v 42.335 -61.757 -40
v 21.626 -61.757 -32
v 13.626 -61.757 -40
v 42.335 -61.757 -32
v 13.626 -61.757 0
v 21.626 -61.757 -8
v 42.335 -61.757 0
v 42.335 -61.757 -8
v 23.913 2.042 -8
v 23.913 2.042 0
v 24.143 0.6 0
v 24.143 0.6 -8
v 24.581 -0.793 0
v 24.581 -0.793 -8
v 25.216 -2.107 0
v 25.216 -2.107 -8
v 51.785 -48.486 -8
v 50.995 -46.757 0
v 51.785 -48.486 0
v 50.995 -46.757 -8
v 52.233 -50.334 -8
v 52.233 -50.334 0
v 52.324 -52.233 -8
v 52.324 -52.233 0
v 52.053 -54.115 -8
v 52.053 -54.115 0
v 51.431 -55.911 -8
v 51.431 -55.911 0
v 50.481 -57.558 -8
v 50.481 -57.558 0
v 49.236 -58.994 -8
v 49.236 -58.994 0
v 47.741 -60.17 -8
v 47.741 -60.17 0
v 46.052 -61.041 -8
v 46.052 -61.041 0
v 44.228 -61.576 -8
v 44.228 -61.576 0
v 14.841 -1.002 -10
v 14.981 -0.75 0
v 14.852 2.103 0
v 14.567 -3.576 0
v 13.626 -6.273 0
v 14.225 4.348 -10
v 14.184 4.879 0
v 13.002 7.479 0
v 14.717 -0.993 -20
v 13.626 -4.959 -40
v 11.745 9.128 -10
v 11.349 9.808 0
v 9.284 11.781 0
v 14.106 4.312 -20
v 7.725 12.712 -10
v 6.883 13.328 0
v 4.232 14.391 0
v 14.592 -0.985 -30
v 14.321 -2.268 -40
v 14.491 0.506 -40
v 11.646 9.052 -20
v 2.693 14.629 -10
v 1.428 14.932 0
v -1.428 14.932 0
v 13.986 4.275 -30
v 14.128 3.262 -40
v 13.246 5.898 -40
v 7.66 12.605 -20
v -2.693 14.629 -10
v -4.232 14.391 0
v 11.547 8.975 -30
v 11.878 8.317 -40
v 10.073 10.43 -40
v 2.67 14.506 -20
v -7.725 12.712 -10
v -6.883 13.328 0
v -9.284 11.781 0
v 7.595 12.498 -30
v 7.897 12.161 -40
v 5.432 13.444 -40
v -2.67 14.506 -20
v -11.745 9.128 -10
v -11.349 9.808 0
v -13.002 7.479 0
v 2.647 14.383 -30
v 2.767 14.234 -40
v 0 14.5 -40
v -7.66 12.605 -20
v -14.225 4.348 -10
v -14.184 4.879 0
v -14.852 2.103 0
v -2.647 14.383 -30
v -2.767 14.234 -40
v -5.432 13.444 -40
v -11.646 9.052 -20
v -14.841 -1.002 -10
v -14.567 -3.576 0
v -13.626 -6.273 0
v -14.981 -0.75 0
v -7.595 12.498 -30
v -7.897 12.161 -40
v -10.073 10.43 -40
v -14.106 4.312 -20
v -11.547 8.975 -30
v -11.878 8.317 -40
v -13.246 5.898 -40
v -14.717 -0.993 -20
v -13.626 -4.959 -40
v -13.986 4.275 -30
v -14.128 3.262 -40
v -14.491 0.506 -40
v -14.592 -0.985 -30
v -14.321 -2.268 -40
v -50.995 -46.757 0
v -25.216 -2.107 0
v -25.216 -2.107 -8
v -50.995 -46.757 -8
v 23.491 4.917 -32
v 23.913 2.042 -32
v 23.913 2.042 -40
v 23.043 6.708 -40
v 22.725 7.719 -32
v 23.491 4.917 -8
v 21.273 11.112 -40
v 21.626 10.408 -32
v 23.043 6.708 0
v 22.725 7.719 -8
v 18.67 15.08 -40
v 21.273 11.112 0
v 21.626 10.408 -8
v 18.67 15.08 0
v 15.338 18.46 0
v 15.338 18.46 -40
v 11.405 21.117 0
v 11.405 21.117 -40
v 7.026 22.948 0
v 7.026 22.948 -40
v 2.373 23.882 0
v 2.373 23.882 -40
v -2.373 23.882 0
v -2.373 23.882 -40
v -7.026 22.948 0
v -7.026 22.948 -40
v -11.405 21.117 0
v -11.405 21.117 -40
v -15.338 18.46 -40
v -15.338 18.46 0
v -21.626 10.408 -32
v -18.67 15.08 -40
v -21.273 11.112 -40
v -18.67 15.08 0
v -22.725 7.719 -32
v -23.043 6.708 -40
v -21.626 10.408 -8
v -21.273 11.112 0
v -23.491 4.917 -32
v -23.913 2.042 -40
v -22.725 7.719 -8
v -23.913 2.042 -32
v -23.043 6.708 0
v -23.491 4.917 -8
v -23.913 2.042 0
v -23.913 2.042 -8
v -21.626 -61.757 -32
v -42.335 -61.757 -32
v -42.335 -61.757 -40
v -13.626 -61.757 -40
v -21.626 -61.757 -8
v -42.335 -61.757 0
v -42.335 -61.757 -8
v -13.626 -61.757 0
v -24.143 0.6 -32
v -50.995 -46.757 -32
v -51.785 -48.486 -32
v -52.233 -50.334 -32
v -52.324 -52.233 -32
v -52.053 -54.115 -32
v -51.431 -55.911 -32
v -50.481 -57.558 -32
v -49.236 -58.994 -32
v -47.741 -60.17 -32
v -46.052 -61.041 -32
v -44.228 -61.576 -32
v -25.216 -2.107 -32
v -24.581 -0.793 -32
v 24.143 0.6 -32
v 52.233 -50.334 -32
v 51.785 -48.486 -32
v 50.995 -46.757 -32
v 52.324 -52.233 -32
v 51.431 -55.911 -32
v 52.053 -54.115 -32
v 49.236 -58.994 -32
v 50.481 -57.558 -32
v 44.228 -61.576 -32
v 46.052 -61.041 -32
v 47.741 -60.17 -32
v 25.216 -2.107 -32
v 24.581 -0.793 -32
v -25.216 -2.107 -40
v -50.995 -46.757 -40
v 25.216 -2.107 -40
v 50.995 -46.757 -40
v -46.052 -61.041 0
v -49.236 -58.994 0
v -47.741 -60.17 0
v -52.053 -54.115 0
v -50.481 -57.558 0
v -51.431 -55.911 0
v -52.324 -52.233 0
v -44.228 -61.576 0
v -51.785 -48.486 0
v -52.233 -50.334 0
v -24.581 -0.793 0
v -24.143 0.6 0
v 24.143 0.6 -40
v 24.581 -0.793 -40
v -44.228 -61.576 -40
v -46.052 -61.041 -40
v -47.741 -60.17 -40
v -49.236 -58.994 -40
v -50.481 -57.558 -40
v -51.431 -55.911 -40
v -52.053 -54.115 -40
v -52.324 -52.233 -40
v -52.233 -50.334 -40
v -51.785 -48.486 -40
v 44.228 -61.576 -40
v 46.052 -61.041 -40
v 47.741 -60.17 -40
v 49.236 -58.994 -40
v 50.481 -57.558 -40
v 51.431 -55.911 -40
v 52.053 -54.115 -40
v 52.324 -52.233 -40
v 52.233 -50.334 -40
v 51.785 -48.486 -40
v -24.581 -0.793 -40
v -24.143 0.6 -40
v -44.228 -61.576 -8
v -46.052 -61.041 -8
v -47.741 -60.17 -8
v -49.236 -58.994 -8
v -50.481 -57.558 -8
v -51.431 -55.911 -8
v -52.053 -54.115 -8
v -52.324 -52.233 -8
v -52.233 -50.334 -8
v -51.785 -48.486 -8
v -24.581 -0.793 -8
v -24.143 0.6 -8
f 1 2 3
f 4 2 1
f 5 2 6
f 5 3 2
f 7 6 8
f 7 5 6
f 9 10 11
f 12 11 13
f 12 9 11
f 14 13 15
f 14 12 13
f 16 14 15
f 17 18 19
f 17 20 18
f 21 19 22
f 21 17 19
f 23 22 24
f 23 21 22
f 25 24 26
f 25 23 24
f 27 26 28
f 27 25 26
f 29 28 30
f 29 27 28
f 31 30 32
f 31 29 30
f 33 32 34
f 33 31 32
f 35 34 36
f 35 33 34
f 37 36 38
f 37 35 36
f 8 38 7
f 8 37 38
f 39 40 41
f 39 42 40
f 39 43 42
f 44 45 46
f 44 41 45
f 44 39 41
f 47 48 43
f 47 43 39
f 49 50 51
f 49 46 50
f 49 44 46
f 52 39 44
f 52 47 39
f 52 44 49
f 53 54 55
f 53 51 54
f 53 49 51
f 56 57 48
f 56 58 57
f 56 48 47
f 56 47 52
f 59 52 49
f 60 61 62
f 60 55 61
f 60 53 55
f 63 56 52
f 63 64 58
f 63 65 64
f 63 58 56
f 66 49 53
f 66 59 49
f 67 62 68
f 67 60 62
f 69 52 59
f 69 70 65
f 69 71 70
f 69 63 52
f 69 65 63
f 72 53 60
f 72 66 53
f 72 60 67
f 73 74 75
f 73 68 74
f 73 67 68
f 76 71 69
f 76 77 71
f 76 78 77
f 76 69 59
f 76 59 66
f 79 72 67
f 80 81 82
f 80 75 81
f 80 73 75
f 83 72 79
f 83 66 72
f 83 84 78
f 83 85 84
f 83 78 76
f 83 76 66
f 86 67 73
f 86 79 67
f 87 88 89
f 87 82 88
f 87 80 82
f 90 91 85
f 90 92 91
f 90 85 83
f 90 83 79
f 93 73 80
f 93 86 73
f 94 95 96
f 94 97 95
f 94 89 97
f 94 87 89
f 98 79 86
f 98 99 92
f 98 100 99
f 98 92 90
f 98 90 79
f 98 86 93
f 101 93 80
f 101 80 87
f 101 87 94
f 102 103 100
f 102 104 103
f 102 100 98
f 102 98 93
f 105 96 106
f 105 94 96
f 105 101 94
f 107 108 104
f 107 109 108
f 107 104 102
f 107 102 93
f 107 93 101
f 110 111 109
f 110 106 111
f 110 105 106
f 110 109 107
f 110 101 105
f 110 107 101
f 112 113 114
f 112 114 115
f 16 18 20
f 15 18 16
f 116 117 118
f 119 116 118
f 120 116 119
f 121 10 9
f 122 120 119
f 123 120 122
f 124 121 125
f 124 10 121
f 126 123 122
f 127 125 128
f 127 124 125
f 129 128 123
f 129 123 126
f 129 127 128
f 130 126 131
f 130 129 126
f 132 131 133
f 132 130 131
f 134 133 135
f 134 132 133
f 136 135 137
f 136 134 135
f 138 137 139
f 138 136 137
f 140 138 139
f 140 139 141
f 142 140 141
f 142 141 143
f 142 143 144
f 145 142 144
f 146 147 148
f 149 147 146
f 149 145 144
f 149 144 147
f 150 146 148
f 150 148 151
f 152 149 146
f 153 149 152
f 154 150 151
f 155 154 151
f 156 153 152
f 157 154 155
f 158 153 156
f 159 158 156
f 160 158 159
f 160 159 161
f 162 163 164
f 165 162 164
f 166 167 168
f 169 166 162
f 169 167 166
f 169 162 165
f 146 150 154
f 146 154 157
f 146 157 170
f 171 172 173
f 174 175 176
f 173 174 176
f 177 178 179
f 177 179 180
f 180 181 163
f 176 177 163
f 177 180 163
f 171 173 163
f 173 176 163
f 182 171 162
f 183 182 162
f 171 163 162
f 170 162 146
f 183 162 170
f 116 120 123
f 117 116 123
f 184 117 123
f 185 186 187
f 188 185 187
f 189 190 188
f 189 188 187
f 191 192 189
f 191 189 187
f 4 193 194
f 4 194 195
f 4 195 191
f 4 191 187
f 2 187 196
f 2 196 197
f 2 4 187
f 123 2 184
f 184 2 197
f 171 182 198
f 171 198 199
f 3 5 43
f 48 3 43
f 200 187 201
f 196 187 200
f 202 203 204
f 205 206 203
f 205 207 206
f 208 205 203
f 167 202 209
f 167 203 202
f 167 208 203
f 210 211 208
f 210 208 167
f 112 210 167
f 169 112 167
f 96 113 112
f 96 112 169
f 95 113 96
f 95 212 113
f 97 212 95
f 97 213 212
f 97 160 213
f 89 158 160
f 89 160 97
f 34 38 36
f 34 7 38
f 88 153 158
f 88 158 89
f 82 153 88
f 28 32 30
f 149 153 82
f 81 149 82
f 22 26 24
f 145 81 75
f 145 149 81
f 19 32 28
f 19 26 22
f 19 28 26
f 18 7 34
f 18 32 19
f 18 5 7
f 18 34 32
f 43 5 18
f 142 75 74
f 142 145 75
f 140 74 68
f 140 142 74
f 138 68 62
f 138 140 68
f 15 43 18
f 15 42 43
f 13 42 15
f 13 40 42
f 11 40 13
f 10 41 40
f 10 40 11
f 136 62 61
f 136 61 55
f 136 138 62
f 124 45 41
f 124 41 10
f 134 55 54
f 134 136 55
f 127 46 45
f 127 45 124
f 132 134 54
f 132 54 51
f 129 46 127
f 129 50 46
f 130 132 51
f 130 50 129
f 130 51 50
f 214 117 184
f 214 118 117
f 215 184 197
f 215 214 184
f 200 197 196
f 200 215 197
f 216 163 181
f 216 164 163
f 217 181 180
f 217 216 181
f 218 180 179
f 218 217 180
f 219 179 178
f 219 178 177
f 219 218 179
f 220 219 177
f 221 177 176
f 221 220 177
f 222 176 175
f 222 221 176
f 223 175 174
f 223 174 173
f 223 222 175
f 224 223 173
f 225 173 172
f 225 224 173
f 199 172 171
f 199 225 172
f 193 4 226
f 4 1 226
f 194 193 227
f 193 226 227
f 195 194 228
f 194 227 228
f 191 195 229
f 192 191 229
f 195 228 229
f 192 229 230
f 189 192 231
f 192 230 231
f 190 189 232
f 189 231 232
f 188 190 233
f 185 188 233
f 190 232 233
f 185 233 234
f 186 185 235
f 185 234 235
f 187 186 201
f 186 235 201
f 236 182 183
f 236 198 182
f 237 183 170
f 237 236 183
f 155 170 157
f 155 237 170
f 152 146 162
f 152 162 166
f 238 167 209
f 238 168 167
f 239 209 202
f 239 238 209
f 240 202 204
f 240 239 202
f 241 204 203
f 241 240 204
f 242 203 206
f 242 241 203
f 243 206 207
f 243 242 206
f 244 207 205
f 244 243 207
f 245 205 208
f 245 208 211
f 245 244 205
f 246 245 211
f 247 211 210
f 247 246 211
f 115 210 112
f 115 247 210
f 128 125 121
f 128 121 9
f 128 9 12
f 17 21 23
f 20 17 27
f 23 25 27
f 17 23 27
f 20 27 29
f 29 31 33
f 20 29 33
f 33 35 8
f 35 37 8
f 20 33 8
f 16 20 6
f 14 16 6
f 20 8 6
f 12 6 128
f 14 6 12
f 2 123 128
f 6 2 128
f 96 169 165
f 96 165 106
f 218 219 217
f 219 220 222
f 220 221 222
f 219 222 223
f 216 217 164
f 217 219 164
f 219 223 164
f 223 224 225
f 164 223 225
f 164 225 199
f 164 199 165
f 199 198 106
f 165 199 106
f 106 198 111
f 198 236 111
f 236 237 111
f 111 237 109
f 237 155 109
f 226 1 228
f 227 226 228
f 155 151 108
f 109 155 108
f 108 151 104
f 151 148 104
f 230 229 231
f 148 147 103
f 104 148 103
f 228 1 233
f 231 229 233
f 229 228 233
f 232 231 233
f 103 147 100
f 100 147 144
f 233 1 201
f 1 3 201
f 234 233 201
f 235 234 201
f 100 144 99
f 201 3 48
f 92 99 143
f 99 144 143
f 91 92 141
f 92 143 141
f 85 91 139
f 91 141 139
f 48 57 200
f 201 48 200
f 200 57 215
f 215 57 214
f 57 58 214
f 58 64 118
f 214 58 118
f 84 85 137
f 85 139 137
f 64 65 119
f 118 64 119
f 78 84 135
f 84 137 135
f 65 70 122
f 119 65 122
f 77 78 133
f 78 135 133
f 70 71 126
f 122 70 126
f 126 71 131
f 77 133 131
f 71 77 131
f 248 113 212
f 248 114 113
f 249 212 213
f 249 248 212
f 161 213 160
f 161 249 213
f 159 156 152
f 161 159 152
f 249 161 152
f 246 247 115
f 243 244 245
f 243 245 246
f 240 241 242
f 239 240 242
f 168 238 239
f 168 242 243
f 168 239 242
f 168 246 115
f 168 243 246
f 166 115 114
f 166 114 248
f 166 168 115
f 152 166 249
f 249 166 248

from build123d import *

# Parameters (mm, degrees)
F3_R      = 24
F4_DEPTH  = 40
F0_R      = 15
F2_R      = 14.5
F7_DEPTH  = 40.0010001
F9_DEPTH  = 40
F10_W     = 38.0299583572
F10_H     = 24
F11_DEPTH = 85.7581399225
F12_R     = 10
F13_R     = 10


# Not quite as in the source:
# - a pattern or mirror of a feature is missing from the dataset's text; its kind, count and spacing are read off the source's solid


with BuildPart() as f4:
    # F3 (on Top) → F4 (new body)
    with BuildSketch(Plane.XY):
        Circle(F3_R)
    extrude(amount=-F4_DEPTH)

    # F0 (on Top) → F5 section 0
    with BuildSketch(Plane.XY):
        Circle(F0_R)
    # F2 (on offset) → F5 section 1
    with BuildSketch(Plane.XY.offset(-40)):
        Circle(F2_R)
    loft(mode=Mode.SUBTRACT)

    # F6 (on face) → F7 (cut, through all)
    with BuildSketch(Plane.XY):
        with BuildLine():
            Line((-13.6255430014, -6.272525641), (-13.6255430014, -19.7571399225))
            ThreePointArc((-13.6255430014, -19.7571399225), (0, -24), (13.6255430014, -19.7571399225))
            Line((13.6255430014, -19.7571399225), (13.6255430014, -6.272525641))
            ThreePointArc((13.6255430014, -6.272525641), (0, -15), (-13.6255430014, -6.272525641))
        make_face()
        with BuildLine():
            Line((-13.6255430014, -4.9592920782), (-13.6255430014, -6.272525641))
            ThreePointArc((-13.6255430014, -6.272525641), (0, -15), (13.6255430014, -6.272525641))
            Line((13.6255430014, -6.272525641), (13.6255430014, -4.9592920782))
            ThreePointArc((13.6255430014, -4.9592920782), (0, -14.5), (-13.6255430014, -4.9592920782))
        make_face()
    extrude(amount=-F7_DEPTH, mode=Mode.SUBTRACT)

    # F8 (on face) → F9 (join)
    with BuildSketch(Plane.XY):
        with BuildLine():
            Line((-13.6255430014, -61.7571399225), (-13.6255430014, -19.7571399225))
            ThreePointArc((-13.6255430014, -19.7571399225), (-21.248682689, -11.1576648087), (-24, 0))
            Line((-24, 0), (-59.6555013586, -61.7571399225))
            Line((-59.6555013586, -61.7571399225), (-13.6255430014, -61.7571399225))
        make_face()
        with BuildLine():
            ThreePointArc((24, 0), (21.248682689, -11.1576648087), (13.6255430014, -19.7571399225))
            Line((13.6255430014, -19.7571399225), (13.6255430014, -61.7571399225))
            Line((13.6255430014, -61.7571399225), (59.6555013586, -61.7571399225))
            Line((59.6555013586, -61.7571399225), (24, 0))
        make_face()
    extrude(amount=-F9_DEPTH)

    # F10 (on face) → F11 (cut, through all)
    with BuildSketch(Plane.XZ.offset(61.7571399225)):
        with Locations((-40.64052218, -20)):
            Rectangle(F10_W, F10_H)
    f11 = extrude(amount=-F11_DEPTH, mode=Mode.SUBTRACT)

    # F11_copies: F11 across plane
    add(f11.mirror(Plane(origin=(0, 0, 0), x_dir=(0, 0, 1), z_dir=(1, 0, 0))), mode=Mode.SUBTRACT)

    # F12
    f12_edges = [f4.edges().sort_by_distance(p)[0] for p in [
        (-59.655501, -61.75714, -4),
        (-59.655501, -61.75714, -36),
        (-24, 0, -4),
        (-24, 0, -36),
    ]]
    fillet(f12_edges, radius=F12_R)

    # F13
    f13_edges = [f4.edges().sort_by_distance(p)[0] for p in [
        (59.655501, -61.75714, -4),
        (59.655501, -61.75714, -36),
        (24, 0, -4),
        (24, 0, -36),
    ]]
    fillet(f13_edges, radius=F13_R)


solid = f4.part
